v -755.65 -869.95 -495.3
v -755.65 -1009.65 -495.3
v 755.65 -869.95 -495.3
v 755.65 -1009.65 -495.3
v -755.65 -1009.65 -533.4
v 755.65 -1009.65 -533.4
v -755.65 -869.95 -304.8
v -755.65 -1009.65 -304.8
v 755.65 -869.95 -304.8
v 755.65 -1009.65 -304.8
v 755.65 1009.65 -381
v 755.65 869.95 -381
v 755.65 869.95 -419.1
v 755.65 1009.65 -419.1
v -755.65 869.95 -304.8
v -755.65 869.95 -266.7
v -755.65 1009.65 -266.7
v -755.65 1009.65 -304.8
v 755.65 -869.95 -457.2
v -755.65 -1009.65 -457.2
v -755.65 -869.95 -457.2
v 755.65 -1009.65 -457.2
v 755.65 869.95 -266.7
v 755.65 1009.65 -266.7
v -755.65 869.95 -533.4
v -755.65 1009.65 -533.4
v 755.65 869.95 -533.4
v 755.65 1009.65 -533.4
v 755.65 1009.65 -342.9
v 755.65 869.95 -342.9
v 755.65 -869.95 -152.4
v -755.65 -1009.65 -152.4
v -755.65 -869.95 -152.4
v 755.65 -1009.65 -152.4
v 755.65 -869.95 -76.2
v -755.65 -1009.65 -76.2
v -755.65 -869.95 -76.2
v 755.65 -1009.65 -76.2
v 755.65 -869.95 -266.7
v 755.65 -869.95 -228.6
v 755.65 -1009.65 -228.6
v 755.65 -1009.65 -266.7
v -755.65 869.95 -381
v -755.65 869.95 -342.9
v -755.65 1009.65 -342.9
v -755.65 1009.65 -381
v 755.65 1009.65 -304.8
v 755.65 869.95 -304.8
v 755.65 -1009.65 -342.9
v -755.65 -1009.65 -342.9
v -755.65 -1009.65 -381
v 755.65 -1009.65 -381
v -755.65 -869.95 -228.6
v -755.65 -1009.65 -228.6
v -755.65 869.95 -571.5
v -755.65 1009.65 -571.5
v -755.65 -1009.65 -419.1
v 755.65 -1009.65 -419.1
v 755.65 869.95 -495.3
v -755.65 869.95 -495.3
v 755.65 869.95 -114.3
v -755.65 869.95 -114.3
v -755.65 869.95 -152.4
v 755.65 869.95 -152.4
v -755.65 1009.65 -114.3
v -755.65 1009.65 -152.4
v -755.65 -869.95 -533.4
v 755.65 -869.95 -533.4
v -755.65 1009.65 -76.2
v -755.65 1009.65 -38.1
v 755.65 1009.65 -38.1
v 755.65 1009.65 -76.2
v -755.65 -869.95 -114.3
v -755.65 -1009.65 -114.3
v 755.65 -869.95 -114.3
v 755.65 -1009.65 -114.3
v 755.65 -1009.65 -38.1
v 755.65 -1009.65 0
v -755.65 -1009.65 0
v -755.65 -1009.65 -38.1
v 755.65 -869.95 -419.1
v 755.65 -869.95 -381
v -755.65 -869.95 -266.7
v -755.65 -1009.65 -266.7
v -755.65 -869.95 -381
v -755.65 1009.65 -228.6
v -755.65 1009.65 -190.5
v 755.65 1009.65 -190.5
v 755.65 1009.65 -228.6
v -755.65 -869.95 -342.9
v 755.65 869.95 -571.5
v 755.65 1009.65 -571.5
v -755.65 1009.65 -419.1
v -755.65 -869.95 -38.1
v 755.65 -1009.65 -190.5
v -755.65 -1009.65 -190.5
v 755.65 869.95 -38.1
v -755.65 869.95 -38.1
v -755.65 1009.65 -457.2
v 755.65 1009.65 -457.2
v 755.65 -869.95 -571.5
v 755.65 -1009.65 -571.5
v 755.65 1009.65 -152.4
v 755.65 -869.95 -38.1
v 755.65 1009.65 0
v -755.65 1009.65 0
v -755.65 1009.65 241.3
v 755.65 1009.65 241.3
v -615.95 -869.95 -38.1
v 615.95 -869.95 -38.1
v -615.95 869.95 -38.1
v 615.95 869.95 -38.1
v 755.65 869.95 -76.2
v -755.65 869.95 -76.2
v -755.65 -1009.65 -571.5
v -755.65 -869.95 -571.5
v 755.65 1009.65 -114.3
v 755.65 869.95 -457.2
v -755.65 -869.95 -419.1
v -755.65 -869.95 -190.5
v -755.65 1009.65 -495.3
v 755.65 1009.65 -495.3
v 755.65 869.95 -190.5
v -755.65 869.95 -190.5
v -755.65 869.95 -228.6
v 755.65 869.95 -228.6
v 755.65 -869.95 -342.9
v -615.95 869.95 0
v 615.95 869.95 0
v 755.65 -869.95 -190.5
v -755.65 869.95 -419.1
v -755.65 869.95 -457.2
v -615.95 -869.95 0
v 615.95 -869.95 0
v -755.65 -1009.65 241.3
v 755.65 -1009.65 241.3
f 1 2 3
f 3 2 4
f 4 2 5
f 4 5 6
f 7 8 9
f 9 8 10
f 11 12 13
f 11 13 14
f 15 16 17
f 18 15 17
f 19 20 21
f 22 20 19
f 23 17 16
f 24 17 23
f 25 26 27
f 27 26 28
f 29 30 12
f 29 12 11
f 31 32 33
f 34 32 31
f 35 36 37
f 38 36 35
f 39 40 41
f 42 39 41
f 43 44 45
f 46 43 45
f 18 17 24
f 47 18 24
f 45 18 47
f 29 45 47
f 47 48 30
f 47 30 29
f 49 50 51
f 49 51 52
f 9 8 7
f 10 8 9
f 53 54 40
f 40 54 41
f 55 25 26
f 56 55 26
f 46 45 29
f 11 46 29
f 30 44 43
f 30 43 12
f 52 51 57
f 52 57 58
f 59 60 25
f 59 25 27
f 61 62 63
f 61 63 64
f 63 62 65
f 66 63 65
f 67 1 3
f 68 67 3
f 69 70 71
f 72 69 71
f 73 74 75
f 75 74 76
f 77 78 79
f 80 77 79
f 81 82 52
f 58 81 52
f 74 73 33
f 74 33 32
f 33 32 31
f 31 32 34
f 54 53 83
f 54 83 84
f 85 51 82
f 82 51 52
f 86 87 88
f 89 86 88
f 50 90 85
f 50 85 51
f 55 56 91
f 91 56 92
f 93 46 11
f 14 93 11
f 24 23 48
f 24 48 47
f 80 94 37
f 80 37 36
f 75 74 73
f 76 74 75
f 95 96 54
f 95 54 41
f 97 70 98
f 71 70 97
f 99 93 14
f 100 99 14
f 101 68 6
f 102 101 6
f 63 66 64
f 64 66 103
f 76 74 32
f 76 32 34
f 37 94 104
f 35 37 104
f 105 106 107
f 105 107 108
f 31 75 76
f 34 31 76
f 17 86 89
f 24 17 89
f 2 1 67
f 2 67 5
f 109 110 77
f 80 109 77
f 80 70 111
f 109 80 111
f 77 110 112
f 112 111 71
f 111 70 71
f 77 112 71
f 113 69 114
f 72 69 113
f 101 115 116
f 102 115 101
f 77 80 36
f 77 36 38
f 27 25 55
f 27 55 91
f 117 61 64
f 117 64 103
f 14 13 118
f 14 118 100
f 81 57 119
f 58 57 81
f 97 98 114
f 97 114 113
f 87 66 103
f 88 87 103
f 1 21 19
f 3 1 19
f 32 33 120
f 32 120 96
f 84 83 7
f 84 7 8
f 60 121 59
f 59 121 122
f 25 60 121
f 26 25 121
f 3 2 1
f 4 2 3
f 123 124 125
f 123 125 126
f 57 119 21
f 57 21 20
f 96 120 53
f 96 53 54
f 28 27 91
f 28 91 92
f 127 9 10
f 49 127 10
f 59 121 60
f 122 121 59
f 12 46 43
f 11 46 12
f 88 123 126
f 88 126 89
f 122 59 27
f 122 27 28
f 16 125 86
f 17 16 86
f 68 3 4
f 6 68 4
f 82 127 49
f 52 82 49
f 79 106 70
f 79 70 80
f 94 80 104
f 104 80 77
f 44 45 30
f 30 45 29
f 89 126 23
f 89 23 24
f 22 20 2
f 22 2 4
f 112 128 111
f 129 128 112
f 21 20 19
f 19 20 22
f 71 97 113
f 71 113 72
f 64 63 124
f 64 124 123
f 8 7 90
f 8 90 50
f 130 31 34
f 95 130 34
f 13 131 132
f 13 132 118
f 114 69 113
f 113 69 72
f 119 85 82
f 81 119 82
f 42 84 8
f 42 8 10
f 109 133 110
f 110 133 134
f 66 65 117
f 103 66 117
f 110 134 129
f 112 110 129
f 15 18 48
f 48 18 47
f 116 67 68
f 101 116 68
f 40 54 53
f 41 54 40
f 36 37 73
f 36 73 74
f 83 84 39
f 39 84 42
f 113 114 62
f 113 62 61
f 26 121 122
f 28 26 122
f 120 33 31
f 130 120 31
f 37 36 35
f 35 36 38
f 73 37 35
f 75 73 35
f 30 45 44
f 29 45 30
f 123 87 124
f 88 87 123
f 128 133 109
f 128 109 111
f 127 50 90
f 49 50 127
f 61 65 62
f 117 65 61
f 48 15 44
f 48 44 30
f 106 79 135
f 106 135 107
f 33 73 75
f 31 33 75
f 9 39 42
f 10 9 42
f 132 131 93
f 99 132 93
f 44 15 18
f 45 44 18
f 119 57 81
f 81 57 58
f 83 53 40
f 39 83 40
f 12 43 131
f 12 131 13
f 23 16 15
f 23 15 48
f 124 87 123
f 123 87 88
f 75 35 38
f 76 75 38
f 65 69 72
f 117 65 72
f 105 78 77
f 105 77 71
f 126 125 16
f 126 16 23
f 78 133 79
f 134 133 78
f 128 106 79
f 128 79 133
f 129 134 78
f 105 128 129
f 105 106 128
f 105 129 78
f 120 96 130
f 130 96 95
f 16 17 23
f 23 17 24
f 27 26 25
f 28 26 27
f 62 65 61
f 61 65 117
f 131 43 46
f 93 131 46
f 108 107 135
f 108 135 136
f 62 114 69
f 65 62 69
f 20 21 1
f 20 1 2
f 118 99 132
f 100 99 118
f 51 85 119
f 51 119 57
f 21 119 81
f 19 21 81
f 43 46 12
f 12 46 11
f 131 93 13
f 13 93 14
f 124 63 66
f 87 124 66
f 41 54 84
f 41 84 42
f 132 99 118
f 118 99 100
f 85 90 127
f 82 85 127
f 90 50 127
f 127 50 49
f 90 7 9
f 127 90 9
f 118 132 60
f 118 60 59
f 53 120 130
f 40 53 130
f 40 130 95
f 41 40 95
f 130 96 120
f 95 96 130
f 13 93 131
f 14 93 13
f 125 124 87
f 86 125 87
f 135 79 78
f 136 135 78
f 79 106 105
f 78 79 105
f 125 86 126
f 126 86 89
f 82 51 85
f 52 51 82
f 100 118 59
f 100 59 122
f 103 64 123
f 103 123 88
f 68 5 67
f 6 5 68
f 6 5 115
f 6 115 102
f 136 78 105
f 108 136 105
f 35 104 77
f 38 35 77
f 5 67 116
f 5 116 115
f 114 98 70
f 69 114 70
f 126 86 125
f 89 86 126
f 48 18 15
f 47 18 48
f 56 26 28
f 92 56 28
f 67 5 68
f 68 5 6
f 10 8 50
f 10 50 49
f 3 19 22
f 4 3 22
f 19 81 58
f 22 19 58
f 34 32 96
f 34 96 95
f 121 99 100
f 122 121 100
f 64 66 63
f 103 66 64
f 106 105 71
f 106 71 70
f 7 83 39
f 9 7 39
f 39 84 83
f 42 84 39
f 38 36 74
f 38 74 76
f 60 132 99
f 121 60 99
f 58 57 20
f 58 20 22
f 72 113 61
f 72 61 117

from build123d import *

# Parameters (mm, degrees)
F0_W      = 1511.3
F0_H      = 2019.3
F1_DEPTH  = 241.3
F5_W      = 139.7
F5_H      = 869.95
F6_DEPTH  = 38.1
F7_W      = 1511.3
F7_H      = 139.7
F8_DEPTH  = 38.1
F9_W      = 1511.3
F9_H      = 139.7
F10_DEPTH = 38.1
F11_W     = 1511.3
F11_H     = 139.7
F12_DEPTH = 38.1
F13_W     = 1511.3
F13_H     = 139.7
F14_DEPTH = 38.1
F15_W     = 1511.3
F15_H     = 139.7
F16_DEPTH = 38.1
F17_W     = 1511.3
F17_H     = 139.7
F18_DEPTH = 38.1
F19_W     = 1511.3
F19_H     = 139.7
F20_DEPTH = 38.1
F21_W     = 1511.3
F21_H     = 139.7
F22_DEPTH = 38.1
F23_W     = 1511.3
F23_H     = 139.7
F24_DEPTH = 38.1
F25_W     = 1511.3
F25_H     = 139.7
F26_DEPTH = 38.1
F27_W     = 1511.3
F27_H     = 139.7
F28_DEPTH = 38.1
F29_W     = 1511.3
F29_H     = 139.7
F30_DEPTH = 38.1
F31_W     = 1511.3
F31_H     = 139.7
F32_DEPTH = 38.1
F33_W     = 1511.3
F33_H     = 139.7
F34_DEPTH = 38.1


with BuildPart() as f1:
    # F0 (on Top) → F1 (new body)
    with BuildSketch(Plane.XY):
        Rectangle(F0_W, F0_H)
    extrude(amount=F1_DEPTH)


with BuildPart() as f6:
    # F5 (on face) → F6 (new body)
    with BuildSketch(Plane(origin=(0, 0, 0), x_dir=(1, 0, 0), z_dir=(0, 0, -1))):
        Polygon((755.65, 1009.65), (-755.65, 1009.65), (-755.65, 869.95), (-615.95, 869.95), (615.95, 869.95), (755.65, 869.95), align=None)
        with Locations((-685.8, 434.975)):
            Rectangle(F5_W, F5_H)
        with Locations((685.8, 434.975)):
            Rectangle(F5_W, F5_H)
    extrude(amount=F6_DEPTH)

    # F36: F6 across plane


with BuildPart() as f8:
    # F7 (on face) → F8 (new body)
    with BuildSketch(Plane(origin=(0, 0, -38.1), x_dir=(1, 0, 0), z_dir=(0, 0, -1))):
        with Locations((0, 939.8)):
            Rectangle(F7_W, F7_H)
    extrude(amount=F8_DEPTH)


with BuildPart() as f10:
    # F9 (on face) → F10 (new body)
    with BuildSketch(Plane(origin=(0, 0, -76.2), x_dir=(1, 0, 0), z_dir=(0, 0, -1))):
        with Locations((0, 939.8)):
            Rectangle(F9_W, F9_H)
    extrude(amount=F10_DEPTH)


with BuildPart() as f12:
    # F11 (on face) → F12 (new body)
    with BuildSketch(Plane(origin=(0, 0, -114.3), x_dir=(1, 0, 0), z_dir=(0, 0, -1))):
        with Locations((0, 939.8)):
            Rectangle(F11_W, F11_H)
    extrude(amount=F12_DEPTH)


with BuildPart() as f14:
    # F13 (on face) → F14 (new body)
    with BuildSketch(Plane(origin=(0, 0, -152.4), x_dir=(1, 0, 0), z_dir=(0, 0, -1))):
        with Locations((0, 939.8)):
            Rectangle(F13_W, F13_H)
    extrude(amount=F14_DEPTH)


with BuildPart() as f16:
    # F15 (on face) → F16 (new body)
    with BuildSketch(Plane(origin=(0, 0, -190.5), x_dir=(1, 0, 0), z_dir=(0, 0, -1))):
        with Locations((0, 939.8)):
            Rectangle(F15_W, F15_H)
    extrude(amount=F16_DEPTH)


with BuildPart() as f18:
    # F17 (on face) → F18 (new body)
    with BuildSketch(Plane(origin=(0, 0, -228.6), x_dir=(1, 0, 0), z_dir=(0, 0, -1))):
        with Locations((0, 939.8)):
            Rectangle(F17_W, F17_H)
    extrude(amount=F18_DEPTH)


with BuildPart() as f20:
    # F19 (on face) → F20 (new body)
    with BuildSketch(Plane(origin=(0, 0, -266.7), x_dir=(1, 0, 0), z_dir=(0, 0, -1))):
        with Locations((0, 939.8)):
            Rectangle(F19_W, F19_H)
    extrude(amount=F20_DEPTH)


with BuildPart() as f22:
    # F21 (on face) → F22 (new body)
    with BuildSketch(Plane(origin=(0, 0, -304.8), x_dir=(1, 0, 0), z_dir=(0, 0, -1))):
        with Locations((0, 939.8)):
            Rectangle(F21_W, F21_H)
    extrude(amount=F22_DEPTH)


with BuildPart() as f24:
    # F23 (on face) → F24 (new body)
    with BuildSketch(Plane(origin=(0, 0, -342.9), x_dir=(1, 0, 0), z_dir=(0, 0, -1))):
        with Locations((0, 939.8)):
            Rectangle(F23_W, F23_H)
    extrude(amount=F24_DEPTH)


with BuildPart() as f26:
    # F25 (on face) → F26 (new body)
    with BuildSketch(Plane(origin=(0, 0, -381), x_dir=(1, 0, 0), z_dir=(0, 0, -1))):
        with Locations((0, 939.8)):
            Rectangle(F25_W, F25_H)
    extrude(amount=F26_DEPTH)


with BuildPart() as f28:
    # F27 (on face) → F28 (new body)
    with BuildSketch(Plane(origin=(0, 0, -419.1), x_dir=(1, 0, 0), z_dir=(0, 0, -1))):
        with Locations((0, 939.8)):
            Rectangle(F27_W, F27_H)
    extrude(amount=F28_DEPTH)


with BuildPart() as f30:
    # F29 (on face) → F30 (new body)
    with BuildSketch(Plane(origin=(0, 0, -457.2), x_dir=(1, 0, 0), z_dir=(0, 0, -1))):
        with Locations((0, 939.8)):
            Rectangle(F29_W, F29_H)
    extrude(amount=F30_DEPTH)


with BuildPart() as f32:
    # F31 (on face) → F32 (new body)
    with BuildSketch(Plane(origin=(0, 0, -495.3), x_dir=(1, 0, 0), z_dir=(0, 0, -1))):
        with Locations((0, 939.8)):
            Rectangle(F31_W, F31_H)
    extrude(amount=F32_DEPTH)


with BuildPart() as f34:
    # F33 (on face) → F34 (new body)
    with BuildSketch(Plane(origin=(0, 0, -533.4), x_dir=(1, 0, 0), z_dir=(0, 0, -1))):
        with Locations((0, 939.8)):
            Rectangle(F33_W, F33_H)
    extrude(amount=F34_DEPTH)


with BuildPart() as f35_1:
    # F35: instance of F10
    add(f10.part.mirror(Plane.XZ))


with BuildPart() as f35_2:
    # F35: instance of F12
    add(f12.part.mirror(Plane.XZ))


with BuildPart() as f35_3:
    # F35: instance of F14
    add(f14.part.mirror(Plane.XZ))


with BuildPart() as f35_4:
    # F35: instance of F16
    add(f16.part.mirror(Plane.XZ))


with BuildPart() as f35_5:
    # F35: instance of F18
    add(f18.part.mirror(Plane.XZ))


with BuildPart() as f35_6:
    # F35: instance of F20
    add(f20.part.mirror(Plane.XZ))


with BuildPart() as f35_7:
    # F35: instance of F22
    add(f22.part.mirror(Plane.XZ))


with BuildPart() as f35_8:
    # F35: instance of F24
    add(f24.part.mirror(Plane.XZ))


with BuildPart() as f35_9:
    # F35: instance of F26
    add(f26.part.mirror(Plane.XZ))


with BuildPart() as f35_10:
    # F35: instance of F28
    add(f28.part.mirror(Plane.XZ))


with BuildPart() as f35_11:
    # F35: instance of F30
    add(f30.part.mirror(Plane.XZ))


with BuildPart() as f35_12:
    # F35: instance of F32
    add(f32.part.mirror(Plane.XZ))


with BuildPart() as f35_13:
    # F35: instance of F34
    add(f34.part.mirror(Plane.XZ))


with BuildPart() as f35_14:
    # F35: instance of F8
    add(f8.part.mirror(Plane.XZ))


with BuildPart() as f6_1:
    add(f6.part)
    add(f6.part.mirror(Plane.XZ))


solid = Compound([f1.part, f8.part, f10.part, f12.part, f14.part, f16.part, f18.part, f20.part, f22.part, f24.part, f26.part, f28.part, f30.part, f32.part, f34.part, f35_1.part, f35_2.part, f35_3.part, f35_4.part, f35_5.part, f35_6.part, f35_7.part, f35_8.part, f35_9.part, f35_10.part, f35_11.part, f35_12.part, f35_13.part, f35_14.part, f6_1.part])
